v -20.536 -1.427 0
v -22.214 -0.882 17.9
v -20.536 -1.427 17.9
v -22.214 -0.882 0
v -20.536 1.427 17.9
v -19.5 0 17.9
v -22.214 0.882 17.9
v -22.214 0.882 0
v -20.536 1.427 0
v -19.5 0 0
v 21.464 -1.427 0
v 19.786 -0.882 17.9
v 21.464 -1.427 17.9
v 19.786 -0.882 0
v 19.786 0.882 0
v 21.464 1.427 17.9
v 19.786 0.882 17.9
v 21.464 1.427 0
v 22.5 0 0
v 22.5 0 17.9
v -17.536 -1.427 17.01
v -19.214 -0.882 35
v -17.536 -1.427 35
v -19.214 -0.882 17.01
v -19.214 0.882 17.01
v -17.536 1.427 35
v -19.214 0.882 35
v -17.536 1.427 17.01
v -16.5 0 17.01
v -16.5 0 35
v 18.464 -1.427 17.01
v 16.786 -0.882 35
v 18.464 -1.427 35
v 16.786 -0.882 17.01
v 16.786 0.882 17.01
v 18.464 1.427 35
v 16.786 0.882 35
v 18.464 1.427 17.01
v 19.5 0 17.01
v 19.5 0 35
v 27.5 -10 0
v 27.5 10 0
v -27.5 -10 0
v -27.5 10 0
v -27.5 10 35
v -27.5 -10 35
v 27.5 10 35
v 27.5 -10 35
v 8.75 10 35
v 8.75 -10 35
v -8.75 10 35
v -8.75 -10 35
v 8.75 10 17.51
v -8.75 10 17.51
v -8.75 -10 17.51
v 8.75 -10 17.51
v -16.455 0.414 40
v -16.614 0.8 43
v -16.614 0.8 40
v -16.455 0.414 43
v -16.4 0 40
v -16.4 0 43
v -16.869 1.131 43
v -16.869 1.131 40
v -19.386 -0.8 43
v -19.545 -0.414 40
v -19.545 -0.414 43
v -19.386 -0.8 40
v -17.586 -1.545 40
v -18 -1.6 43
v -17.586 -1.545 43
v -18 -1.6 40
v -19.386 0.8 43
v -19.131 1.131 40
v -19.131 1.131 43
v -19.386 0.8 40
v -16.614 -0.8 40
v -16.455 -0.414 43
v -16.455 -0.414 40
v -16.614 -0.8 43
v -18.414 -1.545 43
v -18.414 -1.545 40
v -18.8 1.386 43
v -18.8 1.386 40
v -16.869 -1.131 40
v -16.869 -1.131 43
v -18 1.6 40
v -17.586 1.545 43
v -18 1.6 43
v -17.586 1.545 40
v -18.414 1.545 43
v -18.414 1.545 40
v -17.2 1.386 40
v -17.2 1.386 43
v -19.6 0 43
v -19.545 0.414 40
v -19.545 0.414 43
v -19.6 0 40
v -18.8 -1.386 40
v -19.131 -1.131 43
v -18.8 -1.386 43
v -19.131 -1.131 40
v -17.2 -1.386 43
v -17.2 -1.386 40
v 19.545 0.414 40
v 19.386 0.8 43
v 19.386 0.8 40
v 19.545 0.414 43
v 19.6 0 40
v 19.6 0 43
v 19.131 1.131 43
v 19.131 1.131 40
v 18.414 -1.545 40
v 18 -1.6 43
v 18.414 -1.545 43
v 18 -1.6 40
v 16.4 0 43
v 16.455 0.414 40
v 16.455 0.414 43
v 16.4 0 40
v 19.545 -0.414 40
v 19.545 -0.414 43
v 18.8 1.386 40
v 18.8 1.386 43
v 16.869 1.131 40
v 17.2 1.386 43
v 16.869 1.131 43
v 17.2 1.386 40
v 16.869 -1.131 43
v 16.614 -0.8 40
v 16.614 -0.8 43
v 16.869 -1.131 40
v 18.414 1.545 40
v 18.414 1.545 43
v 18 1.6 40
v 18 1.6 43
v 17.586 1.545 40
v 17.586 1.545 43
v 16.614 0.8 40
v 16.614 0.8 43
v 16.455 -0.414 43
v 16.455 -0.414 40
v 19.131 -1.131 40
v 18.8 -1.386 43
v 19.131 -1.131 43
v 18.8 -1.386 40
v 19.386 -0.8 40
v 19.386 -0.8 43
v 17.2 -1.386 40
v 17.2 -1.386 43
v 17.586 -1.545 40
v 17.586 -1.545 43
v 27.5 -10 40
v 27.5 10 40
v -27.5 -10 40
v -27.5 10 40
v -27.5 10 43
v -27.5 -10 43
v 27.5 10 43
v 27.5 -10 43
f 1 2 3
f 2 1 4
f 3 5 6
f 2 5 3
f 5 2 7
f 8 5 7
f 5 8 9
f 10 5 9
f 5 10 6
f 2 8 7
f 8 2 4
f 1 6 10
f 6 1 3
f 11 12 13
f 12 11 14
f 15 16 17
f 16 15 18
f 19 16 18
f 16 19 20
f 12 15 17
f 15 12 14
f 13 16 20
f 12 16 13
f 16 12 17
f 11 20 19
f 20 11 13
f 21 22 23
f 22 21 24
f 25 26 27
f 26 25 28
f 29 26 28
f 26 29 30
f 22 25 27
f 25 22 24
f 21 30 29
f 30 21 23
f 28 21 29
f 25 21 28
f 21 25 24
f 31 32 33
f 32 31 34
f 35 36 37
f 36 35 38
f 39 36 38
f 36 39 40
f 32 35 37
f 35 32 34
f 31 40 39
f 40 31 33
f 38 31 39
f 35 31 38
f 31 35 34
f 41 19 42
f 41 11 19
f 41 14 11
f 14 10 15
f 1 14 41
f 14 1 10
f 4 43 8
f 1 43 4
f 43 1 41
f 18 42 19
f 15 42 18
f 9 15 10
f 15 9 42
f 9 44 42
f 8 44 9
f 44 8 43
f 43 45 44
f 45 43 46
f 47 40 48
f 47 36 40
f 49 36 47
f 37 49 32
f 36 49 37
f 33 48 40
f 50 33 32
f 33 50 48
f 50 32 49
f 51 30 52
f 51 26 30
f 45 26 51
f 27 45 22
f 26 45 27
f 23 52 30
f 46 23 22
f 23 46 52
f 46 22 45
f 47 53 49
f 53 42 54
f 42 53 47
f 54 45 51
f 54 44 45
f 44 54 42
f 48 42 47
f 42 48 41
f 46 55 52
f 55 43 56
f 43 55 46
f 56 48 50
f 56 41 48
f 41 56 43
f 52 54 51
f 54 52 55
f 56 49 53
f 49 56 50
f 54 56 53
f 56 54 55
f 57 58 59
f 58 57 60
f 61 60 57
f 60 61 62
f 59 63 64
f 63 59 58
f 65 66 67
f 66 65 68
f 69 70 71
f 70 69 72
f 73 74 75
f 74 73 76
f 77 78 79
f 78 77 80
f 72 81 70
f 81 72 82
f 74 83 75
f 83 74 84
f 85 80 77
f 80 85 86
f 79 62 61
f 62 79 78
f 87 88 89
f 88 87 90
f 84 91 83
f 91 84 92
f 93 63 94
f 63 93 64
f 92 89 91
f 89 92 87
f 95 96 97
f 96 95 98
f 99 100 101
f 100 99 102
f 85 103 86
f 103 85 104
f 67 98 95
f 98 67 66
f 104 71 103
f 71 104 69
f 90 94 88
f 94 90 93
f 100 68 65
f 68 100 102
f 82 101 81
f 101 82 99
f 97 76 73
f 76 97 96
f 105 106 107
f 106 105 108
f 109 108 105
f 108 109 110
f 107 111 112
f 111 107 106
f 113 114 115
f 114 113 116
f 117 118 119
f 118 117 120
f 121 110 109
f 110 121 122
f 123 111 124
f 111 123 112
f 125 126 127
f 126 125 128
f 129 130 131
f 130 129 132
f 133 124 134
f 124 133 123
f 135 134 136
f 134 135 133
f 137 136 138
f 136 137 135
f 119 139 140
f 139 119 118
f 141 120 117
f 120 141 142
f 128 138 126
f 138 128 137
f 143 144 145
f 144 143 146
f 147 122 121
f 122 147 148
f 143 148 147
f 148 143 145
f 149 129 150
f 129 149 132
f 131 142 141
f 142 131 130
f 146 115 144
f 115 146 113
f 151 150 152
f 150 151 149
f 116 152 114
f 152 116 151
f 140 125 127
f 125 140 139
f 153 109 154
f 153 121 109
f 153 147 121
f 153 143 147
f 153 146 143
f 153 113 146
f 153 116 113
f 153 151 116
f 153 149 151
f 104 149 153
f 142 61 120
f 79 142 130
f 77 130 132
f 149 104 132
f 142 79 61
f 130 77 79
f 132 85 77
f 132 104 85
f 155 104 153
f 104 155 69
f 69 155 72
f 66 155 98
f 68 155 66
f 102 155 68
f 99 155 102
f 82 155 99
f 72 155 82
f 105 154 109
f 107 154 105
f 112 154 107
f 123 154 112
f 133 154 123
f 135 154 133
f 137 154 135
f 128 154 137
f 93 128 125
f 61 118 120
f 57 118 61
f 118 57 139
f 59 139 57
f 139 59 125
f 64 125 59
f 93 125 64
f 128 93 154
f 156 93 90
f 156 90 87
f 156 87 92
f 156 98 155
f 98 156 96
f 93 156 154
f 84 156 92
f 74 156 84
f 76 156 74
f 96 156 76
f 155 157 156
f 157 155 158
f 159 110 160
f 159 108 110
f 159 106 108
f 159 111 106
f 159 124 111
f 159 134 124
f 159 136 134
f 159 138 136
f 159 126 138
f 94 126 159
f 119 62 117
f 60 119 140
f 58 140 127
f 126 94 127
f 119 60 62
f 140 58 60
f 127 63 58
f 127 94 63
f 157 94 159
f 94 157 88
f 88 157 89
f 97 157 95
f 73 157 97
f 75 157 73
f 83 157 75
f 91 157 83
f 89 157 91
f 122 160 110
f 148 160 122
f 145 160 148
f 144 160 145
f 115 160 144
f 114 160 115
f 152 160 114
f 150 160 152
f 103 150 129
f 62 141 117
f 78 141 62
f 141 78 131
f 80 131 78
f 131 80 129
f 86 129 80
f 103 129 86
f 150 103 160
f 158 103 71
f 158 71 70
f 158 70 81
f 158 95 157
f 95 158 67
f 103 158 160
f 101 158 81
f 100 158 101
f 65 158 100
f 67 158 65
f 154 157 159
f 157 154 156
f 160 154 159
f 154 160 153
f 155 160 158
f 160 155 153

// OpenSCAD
width = 55;
height = 35;

module PlaceAtCentres(cx) {
  dx = cx / 2;
  for (x = [-dx, dx]) {
    translate([x, 0]) {
      children();
    }
  }
}

module Main() {
  difference() {
    // Body
    linear_extrude(height) {
      square([width, 20], center = true);
    }

    // Pump body cutout
    translate([0, 0, height - (17.5 / 2) + 0.01]) {
      rotate([90, 0, 0]) {
        cube([17.5, 17.5, 22], center = true);
      }
    }

    // Case mounting holes
    translate([0, 0, -0.1]) {
      PlaceAtCentres(cx = 42) {
        cylinder(d = 3, h = 18, $fn = 5);
      }
    }

    // Clamp mounting holes
    translate([0, 0, height - 18 + 0.01]) {
      PlaceAtCentres(cx = 36) {
        cylinder(d = 3, h = 18, $fn = 5);
      }
    }
  }
}

module Clamp() {
  difference() {
    // Body
    linear_extrude(3) {
      square([width, 20], center = true);
    }

    // Clamp mounting holes
    translate([0, 0, 3 / 2]) {
      PlaceAtCentres(cx = 36) {
        cylinder(d = 3.2, h = 3.02, center = true, $fn = 24);
      }
    }
  }
}

Main();

translate([0, 0, 40]) {
  Clamp();
}
